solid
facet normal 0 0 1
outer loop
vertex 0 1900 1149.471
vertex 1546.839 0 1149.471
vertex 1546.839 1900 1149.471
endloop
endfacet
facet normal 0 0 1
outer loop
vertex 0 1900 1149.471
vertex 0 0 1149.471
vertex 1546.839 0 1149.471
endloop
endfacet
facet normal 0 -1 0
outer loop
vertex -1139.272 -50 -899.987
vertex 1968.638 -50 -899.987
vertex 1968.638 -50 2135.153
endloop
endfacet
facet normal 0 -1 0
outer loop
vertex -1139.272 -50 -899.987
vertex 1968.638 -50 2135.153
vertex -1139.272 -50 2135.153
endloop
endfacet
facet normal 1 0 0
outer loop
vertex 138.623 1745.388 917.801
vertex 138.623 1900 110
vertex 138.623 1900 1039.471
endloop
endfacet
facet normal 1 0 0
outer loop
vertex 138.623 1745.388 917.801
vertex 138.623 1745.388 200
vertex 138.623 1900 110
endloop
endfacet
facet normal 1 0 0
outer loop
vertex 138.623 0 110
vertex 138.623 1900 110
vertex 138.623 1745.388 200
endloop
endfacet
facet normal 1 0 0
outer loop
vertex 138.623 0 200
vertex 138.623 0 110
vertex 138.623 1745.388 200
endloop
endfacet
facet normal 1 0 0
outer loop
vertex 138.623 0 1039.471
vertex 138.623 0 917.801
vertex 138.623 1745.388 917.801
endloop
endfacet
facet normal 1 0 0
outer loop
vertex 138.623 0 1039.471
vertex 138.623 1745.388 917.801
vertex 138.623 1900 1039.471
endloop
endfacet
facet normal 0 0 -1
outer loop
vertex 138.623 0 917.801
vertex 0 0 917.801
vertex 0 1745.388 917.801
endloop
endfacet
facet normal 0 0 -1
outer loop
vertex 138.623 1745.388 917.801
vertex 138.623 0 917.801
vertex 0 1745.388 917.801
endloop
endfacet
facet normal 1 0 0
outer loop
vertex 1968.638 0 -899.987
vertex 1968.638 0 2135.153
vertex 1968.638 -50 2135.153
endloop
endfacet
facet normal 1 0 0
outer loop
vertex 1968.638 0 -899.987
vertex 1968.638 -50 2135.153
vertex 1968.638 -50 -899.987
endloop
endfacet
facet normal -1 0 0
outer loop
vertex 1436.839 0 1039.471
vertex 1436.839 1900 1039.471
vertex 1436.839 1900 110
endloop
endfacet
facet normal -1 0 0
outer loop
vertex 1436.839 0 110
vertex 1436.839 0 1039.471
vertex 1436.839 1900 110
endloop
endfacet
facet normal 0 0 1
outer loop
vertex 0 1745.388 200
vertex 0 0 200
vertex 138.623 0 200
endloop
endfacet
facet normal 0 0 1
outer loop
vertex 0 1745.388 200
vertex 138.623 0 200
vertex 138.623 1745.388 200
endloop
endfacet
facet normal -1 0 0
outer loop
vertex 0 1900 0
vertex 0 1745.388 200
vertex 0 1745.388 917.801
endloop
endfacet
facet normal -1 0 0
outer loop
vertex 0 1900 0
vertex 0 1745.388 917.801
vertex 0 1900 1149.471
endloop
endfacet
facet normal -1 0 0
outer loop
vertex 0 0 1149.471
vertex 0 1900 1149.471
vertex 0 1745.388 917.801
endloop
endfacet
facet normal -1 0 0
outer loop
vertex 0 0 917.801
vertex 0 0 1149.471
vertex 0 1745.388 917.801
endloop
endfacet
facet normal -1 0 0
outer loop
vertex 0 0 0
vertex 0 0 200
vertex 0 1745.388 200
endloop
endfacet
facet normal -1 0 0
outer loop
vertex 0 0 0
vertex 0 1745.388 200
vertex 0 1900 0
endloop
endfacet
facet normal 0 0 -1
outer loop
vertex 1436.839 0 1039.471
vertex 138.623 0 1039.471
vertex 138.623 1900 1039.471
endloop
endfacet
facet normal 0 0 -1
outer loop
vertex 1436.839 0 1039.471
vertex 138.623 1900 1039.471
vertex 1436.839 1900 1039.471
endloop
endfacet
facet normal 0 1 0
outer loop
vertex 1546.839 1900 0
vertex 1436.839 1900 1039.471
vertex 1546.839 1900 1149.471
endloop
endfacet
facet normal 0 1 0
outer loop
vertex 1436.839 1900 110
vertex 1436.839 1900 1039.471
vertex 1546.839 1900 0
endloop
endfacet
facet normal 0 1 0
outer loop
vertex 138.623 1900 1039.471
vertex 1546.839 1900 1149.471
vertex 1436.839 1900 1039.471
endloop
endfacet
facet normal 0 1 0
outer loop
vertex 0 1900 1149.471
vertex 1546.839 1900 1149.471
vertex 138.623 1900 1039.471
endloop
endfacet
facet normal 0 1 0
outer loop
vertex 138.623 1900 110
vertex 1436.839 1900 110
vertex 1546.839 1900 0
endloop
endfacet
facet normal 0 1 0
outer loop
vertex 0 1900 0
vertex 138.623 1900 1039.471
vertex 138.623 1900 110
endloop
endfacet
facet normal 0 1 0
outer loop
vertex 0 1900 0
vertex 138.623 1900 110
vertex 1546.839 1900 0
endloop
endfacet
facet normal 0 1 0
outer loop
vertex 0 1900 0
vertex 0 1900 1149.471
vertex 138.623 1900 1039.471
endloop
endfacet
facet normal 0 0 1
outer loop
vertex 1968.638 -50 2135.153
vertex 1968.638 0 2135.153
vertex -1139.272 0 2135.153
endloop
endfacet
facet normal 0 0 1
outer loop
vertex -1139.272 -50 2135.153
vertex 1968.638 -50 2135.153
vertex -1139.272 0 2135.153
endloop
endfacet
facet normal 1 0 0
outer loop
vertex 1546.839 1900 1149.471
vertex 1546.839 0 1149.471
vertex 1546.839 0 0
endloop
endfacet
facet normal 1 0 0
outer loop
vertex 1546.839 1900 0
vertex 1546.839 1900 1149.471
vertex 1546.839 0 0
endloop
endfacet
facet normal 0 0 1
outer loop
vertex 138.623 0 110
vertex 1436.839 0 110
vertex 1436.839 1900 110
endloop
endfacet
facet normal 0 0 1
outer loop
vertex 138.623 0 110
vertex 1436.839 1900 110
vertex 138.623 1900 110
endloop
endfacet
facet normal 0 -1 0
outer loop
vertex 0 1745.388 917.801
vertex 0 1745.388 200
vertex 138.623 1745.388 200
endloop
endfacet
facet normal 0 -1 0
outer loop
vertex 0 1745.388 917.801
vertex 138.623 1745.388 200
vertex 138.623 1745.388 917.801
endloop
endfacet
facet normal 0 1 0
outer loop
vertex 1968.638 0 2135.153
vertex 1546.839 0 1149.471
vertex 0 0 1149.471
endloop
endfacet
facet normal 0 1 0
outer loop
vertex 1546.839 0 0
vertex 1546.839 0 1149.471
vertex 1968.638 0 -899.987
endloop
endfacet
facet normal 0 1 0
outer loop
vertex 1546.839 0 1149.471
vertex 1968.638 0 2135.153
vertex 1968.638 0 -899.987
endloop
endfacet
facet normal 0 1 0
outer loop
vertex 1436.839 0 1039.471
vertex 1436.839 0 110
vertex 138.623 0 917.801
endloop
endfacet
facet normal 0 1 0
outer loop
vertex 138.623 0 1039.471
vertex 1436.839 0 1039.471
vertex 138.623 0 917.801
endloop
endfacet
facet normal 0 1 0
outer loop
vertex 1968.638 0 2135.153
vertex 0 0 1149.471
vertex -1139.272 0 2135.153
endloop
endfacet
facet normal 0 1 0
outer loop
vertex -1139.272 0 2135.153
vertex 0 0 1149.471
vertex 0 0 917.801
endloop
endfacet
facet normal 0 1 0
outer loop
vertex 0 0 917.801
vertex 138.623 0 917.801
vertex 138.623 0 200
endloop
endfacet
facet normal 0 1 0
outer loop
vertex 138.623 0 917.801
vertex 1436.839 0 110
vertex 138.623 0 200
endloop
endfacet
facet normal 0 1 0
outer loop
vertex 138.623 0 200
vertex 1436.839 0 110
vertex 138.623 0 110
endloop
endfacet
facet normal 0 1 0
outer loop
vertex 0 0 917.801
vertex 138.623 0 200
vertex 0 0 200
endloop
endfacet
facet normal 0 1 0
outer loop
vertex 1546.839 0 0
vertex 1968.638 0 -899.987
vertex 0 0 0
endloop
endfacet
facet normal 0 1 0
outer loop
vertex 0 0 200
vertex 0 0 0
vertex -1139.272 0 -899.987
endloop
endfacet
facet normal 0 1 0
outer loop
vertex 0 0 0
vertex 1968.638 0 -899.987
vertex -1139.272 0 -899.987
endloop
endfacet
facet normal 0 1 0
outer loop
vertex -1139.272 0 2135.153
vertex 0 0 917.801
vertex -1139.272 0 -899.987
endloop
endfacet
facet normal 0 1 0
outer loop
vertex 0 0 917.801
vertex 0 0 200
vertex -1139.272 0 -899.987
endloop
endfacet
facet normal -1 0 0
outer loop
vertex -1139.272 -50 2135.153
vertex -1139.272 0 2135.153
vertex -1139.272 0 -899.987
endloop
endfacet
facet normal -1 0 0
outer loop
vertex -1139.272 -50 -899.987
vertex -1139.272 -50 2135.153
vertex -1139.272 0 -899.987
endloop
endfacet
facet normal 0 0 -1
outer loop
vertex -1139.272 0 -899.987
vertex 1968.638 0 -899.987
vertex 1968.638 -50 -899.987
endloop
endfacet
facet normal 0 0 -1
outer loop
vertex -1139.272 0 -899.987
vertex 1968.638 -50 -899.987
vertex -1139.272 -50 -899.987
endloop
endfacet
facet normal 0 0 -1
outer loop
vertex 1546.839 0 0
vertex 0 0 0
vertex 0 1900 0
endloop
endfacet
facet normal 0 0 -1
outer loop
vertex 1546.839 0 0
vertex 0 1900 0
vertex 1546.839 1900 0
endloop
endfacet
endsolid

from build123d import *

# Parameters (mm, degrees)
BOSS_EXTRUDE2_DEPTH = 1900
SKETCH6_W           = 717.800772957
SKETCH6_H           = 1750.329682958
CUT_EXTRUDE1_DEPTH  = 1900
SKETCH7_W           = 3107.9102049
SKETCH7_H           = 3035.139999399
BOSS_EXTRUDE3_DEPTH = 50
SKETCH9_W           = 1149.471046449
SKETCH9_H           = 1900
BOSS_EXTRUDE4_DEPTH = 110


with BuildPart() as part:
    # Sketch3 → Boss-Extrude2 (new body)
    with BuildSketch(Plane(origin=(0, 0, 0), x_dir=(1, 0, 0), z_dir=(0, 1, 0))):
        Polygon((0, 0), (1436.838808061, 0), (1436.838808061, -110), (138.623418893, -110), (138.623418893, -1039.471046449), (1436.838808061, -1039.471046449), (1436.838808061, -1149.471046449), (0, -1149.471046449), align=None)
    extrude(amount=BOSS_EXTRUDE2_DEPTH)

    # Sketch6 → Cut-Extrude1 (cut)
    with BuildSketch(Plane.ZY):
        with Locations((558.900386478, 870.222843645)):
            Rectangle(SKETCH6_W, SKETCH6_H)
    extrude(amount=-CUT_EXTRUDE1_DEPTH, mode=Mode.SUBTRACT)

    # Sketch7 → Boss-Extrude3 (add)
    with BuildSketch(Plane(origin=(0, 0, 0), x_dir=(-1, 0, 0), z_dir=(0, -1, 0))):
        with Locations((-414.683163696, -617.583338218)):
            Rectangle(SKETCH7_W, SKETCH7_H)
    extrude(amount=BOSS_EXTRUDE3_DEPTH)

    # Sketch9 → Boss-Extrude4 (add)
    with BuildSketch(Plane(origin=(1436.838808061, 0, 0), x_dir=(0, 0, -1), z_dir=(1, 0, 0))):
        with Locations((-574.735523225, 950)):
            Rectangle(SKETCH9_W, SKETCH9_H)
    extrude(amount=BOSS_EXTRUDE4_DEPTH)


solid = part.part
